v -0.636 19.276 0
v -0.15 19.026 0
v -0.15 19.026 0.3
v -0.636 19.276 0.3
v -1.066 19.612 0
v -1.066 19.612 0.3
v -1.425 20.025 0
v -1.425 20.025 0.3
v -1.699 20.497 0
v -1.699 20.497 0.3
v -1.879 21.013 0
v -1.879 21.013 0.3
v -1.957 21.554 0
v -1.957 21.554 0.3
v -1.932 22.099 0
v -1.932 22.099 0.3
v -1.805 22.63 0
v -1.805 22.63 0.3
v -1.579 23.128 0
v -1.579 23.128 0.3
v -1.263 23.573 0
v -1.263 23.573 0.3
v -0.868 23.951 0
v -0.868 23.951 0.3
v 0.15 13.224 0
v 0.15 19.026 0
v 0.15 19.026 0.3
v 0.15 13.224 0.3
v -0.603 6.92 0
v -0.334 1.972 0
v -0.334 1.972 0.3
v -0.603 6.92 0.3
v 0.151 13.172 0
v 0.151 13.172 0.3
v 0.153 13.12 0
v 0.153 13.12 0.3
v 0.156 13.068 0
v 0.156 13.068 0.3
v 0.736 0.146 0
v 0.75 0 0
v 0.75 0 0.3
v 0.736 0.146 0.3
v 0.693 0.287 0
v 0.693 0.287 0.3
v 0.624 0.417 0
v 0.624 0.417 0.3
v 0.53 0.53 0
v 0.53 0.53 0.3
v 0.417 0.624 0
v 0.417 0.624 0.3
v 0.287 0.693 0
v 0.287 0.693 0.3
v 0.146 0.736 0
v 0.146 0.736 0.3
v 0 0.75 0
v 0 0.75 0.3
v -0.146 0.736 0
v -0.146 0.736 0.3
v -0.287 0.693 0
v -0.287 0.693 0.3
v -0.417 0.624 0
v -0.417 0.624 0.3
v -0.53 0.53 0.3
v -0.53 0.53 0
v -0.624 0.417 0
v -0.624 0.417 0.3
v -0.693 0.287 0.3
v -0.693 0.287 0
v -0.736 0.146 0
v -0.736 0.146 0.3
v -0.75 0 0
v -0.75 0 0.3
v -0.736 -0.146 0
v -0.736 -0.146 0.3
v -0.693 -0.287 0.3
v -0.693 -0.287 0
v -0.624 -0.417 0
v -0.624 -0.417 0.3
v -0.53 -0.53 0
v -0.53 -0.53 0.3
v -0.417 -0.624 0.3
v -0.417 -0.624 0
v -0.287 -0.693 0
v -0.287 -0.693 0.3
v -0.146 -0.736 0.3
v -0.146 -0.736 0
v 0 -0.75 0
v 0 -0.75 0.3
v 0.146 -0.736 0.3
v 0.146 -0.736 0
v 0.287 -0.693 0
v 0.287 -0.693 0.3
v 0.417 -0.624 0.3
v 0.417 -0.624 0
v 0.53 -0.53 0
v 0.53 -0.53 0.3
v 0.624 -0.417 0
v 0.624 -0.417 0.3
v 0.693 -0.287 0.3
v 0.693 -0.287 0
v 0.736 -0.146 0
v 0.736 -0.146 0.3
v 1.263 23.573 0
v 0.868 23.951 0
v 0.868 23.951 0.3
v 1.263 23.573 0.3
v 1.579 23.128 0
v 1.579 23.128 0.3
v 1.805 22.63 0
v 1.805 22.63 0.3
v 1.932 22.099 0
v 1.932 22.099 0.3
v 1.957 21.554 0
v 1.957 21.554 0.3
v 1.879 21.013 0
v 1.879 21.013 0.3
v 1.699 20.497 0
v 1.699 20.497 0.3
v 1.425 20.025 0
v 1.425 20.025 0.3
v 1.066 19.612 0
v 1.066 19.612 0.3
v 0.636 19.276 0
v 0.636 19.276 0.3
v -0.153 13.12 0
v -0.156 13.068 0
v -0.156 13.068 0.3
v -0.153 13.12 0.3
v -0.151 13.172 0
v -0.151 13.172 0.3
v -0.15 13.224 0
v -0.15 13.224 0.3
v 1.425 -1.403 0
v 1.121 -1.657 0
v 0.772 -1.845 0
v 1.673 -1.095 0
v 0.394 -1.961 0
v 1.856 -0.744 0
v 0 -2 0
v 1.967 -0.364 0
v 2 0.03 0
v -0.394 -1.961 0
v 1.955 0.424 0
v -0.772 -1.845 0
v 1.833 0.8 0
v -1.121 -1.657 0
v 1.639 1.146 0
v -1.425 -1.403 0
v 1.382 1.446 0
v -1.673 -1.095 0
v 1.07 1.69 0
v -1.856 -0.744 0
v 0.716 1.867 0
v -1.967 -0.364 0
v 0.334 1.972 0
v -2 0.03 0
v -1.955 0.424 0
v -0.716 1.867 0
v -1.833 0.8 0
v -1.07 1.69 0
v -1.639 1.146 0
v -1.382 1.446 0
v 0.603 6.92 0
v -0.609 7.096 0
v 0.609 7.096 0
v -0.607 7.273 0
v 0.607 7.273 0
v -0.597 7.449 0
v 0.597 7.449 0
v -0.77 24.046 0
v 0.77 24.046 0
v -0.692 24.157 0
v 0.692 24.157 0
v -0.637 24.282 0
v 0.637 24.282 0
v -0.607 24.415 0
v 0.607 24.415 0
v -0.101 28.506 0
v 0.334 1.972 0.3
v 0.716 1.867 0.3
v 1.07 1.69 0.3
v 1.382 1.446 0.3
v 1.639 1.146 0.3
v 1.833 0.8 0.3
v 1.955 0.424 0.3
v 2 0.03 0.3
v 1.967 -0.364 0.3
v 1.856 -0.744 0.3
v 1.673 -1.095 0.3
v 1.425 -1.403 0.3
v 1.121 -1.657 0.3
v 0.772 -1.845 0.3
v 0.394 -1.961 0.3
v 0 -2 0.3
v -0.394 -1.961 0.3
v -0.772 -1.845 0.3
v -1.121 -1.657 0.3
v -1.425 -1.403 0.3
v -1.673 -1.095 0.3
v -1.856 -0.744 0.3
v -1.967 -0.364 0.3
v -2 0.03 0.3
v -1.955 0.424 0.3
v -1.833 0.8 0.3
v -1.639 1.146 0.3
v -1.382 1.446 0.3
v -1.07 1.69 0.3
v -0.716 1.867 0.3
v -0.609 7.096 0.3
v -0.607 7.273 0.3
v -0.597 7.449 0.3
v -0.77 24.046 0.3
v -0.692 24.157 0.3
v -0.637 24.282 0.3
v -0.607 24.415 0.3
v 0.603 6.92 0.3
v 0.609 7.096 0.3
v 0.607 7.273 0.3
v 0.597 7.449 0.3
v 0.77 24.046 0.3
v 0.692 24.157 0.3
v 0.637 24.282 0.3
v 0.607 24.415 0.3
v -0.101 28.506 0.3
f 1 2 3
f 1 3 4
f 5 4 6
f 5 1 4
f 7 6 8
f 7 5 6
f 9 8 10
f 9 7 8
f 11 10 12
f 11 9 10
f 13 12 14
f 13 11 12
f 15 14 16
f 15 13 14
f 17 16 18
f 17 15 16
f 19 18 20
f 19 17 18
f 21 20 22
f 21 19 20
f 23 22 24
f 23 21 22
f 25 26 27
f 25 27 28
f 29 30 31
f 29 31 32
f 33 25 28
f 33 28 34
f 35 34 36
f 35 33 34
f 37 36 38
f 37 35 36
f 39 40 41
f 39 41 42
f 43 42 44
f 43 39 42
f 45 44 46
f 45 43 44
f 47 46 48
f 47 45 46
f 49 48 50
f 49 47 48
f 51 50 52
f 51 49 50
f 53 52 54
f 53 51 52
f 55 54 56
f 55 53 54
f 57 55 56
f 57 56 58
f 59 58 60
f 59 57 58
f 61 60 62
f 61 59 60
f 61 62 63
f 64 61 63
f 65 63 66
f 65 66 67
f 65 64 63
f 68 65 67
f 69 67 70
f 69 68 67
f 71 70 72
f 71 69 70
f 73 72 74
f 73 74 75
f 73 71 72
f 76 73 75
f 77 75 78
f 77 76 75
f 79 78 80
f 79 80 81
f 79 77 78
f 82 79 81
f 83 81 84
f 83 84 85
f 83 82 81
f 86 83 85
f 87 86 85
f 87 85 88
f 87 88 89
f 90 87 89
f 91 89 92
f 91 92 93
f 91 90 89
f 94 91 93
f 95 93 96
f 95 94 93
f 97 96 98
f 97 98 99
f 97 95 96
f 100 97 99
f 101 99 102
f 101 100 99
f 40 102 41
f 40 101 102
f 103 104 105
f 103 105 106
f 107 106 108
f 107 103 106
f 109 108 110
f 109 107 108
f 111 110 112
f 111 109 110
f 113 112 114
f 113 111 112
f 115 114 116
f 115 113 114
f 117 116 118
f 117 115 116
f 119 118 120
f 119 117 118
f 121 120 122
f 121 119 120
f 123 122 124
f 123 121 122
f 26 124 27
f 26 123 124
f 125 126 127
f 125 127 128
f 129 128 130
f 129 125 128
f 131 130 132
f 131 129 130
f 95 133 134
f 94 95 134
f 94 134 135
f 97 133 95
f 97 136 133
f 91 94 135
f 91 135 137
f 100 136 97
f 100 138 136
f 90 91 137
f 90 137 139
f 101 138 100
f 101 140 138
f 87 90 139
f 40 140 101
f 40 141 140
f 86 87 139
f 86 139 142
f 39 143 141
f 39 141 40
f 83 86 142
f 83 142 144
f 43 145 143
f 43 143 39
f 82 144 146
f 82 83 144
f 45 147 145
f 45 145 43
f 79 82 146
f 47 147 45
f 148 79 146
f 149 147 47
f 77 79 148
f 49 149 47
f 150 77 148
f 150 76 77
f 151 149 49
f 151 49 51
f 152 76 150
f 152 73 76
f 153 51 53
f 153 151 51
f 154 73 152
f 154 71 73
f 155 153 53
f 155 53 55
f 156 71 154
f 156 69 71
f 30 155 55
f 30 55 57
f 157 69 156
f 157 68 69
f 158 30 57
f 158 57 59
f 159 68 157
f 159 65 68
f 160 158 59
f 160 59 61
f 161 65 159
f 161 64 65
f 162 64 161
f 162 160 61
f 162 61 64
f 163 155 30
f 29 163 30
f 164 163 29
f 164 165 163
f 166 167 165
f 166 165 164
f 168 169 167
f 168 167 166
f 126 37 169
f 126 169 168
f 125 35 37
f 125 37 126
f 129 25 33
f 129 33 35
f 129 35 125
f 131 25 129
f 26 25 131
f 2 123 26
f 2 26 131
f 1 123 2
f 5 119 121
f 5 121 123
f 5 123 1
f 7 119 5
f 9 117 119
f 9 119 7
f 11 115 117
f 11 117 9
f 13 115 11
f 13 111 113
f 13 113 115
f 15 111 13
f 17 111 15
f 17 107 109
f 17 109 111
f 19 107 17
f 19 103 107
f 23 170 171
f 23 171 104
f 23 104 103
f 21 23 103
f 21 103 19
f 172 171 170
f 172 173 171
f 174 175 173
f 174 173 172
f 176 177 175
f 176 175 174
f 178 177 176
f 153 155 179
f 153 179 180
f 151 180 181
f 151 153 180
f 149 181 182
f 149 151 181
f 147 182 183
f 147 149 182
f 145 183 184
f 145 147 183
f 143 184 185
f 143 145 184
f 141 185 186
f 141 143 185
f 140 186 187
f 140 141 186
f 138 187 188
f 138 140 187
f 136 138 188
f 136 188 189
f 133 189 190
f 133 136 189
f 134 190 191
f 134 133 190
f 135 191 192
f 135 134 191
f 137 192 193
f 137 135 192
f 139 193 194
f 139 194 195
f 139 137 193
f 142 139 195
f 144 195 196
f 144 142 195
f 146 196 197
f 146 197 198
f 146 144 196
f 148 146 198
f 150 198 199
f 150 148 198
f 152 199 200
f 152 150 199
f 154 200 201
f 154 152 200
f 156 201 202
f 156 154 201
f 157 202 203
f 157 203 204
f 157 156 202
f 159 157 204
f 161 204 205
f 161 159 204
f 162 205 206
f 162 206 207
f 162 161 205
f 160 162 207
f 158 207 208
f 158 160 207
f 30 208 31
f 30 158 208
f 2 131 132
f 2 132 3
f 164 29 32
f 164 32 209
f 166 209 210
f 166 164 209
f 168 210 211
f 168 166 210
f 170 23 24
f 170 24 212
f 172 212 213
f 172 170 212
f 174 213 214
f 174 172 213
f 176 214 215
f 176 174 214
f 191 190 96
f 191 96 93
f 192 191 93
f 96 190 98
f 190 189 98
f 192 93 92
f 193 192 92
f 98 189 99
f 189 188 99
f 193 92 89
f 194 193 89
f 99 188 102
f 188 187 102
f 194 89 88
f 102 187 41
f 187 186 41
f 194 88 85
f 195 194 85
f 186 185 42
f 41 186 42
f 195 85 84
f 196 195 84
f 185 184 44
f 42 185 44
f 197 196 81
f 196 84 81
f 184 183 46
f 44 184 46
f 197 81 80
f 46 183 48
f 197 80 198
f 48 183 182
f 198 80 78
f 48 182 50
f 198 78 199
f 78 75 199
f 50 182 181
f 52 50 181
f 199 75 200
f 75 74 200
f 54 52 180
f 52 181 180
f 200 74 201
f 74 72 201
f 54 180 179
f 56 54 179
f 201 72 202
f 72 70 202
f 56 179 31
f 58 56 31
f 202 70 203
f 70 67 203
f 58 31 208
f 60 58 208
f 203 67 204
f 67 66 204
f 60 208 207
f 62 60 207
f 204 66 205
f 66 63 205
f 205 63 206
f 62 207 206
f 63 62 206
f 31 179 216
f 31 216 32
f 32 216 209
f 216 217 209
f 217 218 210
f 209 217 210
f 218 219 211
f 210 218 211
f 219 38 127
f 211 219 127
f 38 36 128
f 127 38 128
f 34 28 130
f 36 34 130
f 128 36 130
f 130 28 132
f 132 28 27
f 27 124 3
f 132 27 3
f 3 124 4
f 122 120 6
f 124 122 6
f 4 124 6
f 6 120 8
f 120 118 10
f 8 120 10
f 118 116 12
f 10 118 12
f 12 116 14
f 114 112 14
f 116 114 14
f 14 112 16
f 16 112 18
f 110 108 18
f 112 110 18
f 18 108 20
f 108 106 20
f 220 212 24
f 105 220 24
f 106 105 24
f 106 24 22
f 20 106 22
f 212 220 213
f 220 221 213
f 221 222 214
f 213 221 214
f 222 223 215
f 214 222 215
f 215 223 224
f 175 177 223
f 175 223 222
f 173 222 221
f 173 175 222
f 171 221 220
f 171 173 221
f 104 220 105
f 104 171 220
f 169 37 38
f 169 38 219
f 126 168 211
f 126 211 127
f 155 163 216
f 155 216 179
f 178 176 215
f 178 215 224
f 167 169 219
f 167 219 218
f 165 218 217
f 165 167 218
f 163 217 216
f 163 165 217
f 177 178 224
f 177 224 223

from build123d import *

# Parameters (mm, degrees)
SKETCH1_R           = 0.75
BOSS_EXTRUDE2_DEPTH = 0.3


with BuildPart() as part:
    # Sketch1 → Boss-Extrude2 (new body)
    with BuildSketch(Plane.XY):
        with BuildLine():
            Line((-0.334323817, 1.971858916), (-0.602966855, 6.919879094))
            ThreePointArc((-0.602966855, 6.919879094), (-0.608561245, 7.18473737), (-0.596611597, 7.449385078))
            Line((-0.596611597, 7.449385078), (-0.156118862, 13.067687454))
            ThreePointArc((-0.156118862, 13.067687454), (-0.151530301, 13.145790905), (-0.15, 13.224014062))
            Line((-0.15, 13.224014062), (-0.15, 19.026340954))
            ThreePointArc((-0.15, 19.026340954), (-1.930835311, 21.281447203), (-0.868120306, 23.951187906))
            ThreePointArc((-0.868120306, 23.951187906), (-0.691943741, 24.15713708), (-0.607202, 24.414570725))
            Line((-0.607202, 24.414570725), (-0.100615971, 28.506000973))
            Line((-0.100615971, 28.506000973), (0.607202, 24.414570725))
            ThreePointArc((0.607202, 24.414570725), (0.691943741, 24.15713708), (0.868120306, 23.951187906))
            ThreePointArc((0.868120306, 23.951187906), (1.930835311, 21.281447203), (0.15, 19.026340954))
            Line((0.15, 19.026340954), (0.15, 13.224014062))
            ThreePointArc((0.15, 13.224014062), (0.151530301, 13.145790905), (0.156118862, 13.067687454))
            Line((0.156118862, 13.067687454), (0.596611597, 7.449385078))
            ThreePointArc((0.596611597, 7.449385078), (0.608561245, 7.18473737), (0.602966855, 6.919879094))
            Line((0.602966855, 6.919879094), (0.334323817, 1.971858916))
            ThreePointArc((0.334323817, 1.971858916), (0, -2), (-0.334323817, 1.971858916))
        make_face()
        Circle(SKETCH1_R, mode=Mode.SUBTRACT)
    extrude(amount=BOSS_EXTRUDE2_DEPTH)


solid = part.part
